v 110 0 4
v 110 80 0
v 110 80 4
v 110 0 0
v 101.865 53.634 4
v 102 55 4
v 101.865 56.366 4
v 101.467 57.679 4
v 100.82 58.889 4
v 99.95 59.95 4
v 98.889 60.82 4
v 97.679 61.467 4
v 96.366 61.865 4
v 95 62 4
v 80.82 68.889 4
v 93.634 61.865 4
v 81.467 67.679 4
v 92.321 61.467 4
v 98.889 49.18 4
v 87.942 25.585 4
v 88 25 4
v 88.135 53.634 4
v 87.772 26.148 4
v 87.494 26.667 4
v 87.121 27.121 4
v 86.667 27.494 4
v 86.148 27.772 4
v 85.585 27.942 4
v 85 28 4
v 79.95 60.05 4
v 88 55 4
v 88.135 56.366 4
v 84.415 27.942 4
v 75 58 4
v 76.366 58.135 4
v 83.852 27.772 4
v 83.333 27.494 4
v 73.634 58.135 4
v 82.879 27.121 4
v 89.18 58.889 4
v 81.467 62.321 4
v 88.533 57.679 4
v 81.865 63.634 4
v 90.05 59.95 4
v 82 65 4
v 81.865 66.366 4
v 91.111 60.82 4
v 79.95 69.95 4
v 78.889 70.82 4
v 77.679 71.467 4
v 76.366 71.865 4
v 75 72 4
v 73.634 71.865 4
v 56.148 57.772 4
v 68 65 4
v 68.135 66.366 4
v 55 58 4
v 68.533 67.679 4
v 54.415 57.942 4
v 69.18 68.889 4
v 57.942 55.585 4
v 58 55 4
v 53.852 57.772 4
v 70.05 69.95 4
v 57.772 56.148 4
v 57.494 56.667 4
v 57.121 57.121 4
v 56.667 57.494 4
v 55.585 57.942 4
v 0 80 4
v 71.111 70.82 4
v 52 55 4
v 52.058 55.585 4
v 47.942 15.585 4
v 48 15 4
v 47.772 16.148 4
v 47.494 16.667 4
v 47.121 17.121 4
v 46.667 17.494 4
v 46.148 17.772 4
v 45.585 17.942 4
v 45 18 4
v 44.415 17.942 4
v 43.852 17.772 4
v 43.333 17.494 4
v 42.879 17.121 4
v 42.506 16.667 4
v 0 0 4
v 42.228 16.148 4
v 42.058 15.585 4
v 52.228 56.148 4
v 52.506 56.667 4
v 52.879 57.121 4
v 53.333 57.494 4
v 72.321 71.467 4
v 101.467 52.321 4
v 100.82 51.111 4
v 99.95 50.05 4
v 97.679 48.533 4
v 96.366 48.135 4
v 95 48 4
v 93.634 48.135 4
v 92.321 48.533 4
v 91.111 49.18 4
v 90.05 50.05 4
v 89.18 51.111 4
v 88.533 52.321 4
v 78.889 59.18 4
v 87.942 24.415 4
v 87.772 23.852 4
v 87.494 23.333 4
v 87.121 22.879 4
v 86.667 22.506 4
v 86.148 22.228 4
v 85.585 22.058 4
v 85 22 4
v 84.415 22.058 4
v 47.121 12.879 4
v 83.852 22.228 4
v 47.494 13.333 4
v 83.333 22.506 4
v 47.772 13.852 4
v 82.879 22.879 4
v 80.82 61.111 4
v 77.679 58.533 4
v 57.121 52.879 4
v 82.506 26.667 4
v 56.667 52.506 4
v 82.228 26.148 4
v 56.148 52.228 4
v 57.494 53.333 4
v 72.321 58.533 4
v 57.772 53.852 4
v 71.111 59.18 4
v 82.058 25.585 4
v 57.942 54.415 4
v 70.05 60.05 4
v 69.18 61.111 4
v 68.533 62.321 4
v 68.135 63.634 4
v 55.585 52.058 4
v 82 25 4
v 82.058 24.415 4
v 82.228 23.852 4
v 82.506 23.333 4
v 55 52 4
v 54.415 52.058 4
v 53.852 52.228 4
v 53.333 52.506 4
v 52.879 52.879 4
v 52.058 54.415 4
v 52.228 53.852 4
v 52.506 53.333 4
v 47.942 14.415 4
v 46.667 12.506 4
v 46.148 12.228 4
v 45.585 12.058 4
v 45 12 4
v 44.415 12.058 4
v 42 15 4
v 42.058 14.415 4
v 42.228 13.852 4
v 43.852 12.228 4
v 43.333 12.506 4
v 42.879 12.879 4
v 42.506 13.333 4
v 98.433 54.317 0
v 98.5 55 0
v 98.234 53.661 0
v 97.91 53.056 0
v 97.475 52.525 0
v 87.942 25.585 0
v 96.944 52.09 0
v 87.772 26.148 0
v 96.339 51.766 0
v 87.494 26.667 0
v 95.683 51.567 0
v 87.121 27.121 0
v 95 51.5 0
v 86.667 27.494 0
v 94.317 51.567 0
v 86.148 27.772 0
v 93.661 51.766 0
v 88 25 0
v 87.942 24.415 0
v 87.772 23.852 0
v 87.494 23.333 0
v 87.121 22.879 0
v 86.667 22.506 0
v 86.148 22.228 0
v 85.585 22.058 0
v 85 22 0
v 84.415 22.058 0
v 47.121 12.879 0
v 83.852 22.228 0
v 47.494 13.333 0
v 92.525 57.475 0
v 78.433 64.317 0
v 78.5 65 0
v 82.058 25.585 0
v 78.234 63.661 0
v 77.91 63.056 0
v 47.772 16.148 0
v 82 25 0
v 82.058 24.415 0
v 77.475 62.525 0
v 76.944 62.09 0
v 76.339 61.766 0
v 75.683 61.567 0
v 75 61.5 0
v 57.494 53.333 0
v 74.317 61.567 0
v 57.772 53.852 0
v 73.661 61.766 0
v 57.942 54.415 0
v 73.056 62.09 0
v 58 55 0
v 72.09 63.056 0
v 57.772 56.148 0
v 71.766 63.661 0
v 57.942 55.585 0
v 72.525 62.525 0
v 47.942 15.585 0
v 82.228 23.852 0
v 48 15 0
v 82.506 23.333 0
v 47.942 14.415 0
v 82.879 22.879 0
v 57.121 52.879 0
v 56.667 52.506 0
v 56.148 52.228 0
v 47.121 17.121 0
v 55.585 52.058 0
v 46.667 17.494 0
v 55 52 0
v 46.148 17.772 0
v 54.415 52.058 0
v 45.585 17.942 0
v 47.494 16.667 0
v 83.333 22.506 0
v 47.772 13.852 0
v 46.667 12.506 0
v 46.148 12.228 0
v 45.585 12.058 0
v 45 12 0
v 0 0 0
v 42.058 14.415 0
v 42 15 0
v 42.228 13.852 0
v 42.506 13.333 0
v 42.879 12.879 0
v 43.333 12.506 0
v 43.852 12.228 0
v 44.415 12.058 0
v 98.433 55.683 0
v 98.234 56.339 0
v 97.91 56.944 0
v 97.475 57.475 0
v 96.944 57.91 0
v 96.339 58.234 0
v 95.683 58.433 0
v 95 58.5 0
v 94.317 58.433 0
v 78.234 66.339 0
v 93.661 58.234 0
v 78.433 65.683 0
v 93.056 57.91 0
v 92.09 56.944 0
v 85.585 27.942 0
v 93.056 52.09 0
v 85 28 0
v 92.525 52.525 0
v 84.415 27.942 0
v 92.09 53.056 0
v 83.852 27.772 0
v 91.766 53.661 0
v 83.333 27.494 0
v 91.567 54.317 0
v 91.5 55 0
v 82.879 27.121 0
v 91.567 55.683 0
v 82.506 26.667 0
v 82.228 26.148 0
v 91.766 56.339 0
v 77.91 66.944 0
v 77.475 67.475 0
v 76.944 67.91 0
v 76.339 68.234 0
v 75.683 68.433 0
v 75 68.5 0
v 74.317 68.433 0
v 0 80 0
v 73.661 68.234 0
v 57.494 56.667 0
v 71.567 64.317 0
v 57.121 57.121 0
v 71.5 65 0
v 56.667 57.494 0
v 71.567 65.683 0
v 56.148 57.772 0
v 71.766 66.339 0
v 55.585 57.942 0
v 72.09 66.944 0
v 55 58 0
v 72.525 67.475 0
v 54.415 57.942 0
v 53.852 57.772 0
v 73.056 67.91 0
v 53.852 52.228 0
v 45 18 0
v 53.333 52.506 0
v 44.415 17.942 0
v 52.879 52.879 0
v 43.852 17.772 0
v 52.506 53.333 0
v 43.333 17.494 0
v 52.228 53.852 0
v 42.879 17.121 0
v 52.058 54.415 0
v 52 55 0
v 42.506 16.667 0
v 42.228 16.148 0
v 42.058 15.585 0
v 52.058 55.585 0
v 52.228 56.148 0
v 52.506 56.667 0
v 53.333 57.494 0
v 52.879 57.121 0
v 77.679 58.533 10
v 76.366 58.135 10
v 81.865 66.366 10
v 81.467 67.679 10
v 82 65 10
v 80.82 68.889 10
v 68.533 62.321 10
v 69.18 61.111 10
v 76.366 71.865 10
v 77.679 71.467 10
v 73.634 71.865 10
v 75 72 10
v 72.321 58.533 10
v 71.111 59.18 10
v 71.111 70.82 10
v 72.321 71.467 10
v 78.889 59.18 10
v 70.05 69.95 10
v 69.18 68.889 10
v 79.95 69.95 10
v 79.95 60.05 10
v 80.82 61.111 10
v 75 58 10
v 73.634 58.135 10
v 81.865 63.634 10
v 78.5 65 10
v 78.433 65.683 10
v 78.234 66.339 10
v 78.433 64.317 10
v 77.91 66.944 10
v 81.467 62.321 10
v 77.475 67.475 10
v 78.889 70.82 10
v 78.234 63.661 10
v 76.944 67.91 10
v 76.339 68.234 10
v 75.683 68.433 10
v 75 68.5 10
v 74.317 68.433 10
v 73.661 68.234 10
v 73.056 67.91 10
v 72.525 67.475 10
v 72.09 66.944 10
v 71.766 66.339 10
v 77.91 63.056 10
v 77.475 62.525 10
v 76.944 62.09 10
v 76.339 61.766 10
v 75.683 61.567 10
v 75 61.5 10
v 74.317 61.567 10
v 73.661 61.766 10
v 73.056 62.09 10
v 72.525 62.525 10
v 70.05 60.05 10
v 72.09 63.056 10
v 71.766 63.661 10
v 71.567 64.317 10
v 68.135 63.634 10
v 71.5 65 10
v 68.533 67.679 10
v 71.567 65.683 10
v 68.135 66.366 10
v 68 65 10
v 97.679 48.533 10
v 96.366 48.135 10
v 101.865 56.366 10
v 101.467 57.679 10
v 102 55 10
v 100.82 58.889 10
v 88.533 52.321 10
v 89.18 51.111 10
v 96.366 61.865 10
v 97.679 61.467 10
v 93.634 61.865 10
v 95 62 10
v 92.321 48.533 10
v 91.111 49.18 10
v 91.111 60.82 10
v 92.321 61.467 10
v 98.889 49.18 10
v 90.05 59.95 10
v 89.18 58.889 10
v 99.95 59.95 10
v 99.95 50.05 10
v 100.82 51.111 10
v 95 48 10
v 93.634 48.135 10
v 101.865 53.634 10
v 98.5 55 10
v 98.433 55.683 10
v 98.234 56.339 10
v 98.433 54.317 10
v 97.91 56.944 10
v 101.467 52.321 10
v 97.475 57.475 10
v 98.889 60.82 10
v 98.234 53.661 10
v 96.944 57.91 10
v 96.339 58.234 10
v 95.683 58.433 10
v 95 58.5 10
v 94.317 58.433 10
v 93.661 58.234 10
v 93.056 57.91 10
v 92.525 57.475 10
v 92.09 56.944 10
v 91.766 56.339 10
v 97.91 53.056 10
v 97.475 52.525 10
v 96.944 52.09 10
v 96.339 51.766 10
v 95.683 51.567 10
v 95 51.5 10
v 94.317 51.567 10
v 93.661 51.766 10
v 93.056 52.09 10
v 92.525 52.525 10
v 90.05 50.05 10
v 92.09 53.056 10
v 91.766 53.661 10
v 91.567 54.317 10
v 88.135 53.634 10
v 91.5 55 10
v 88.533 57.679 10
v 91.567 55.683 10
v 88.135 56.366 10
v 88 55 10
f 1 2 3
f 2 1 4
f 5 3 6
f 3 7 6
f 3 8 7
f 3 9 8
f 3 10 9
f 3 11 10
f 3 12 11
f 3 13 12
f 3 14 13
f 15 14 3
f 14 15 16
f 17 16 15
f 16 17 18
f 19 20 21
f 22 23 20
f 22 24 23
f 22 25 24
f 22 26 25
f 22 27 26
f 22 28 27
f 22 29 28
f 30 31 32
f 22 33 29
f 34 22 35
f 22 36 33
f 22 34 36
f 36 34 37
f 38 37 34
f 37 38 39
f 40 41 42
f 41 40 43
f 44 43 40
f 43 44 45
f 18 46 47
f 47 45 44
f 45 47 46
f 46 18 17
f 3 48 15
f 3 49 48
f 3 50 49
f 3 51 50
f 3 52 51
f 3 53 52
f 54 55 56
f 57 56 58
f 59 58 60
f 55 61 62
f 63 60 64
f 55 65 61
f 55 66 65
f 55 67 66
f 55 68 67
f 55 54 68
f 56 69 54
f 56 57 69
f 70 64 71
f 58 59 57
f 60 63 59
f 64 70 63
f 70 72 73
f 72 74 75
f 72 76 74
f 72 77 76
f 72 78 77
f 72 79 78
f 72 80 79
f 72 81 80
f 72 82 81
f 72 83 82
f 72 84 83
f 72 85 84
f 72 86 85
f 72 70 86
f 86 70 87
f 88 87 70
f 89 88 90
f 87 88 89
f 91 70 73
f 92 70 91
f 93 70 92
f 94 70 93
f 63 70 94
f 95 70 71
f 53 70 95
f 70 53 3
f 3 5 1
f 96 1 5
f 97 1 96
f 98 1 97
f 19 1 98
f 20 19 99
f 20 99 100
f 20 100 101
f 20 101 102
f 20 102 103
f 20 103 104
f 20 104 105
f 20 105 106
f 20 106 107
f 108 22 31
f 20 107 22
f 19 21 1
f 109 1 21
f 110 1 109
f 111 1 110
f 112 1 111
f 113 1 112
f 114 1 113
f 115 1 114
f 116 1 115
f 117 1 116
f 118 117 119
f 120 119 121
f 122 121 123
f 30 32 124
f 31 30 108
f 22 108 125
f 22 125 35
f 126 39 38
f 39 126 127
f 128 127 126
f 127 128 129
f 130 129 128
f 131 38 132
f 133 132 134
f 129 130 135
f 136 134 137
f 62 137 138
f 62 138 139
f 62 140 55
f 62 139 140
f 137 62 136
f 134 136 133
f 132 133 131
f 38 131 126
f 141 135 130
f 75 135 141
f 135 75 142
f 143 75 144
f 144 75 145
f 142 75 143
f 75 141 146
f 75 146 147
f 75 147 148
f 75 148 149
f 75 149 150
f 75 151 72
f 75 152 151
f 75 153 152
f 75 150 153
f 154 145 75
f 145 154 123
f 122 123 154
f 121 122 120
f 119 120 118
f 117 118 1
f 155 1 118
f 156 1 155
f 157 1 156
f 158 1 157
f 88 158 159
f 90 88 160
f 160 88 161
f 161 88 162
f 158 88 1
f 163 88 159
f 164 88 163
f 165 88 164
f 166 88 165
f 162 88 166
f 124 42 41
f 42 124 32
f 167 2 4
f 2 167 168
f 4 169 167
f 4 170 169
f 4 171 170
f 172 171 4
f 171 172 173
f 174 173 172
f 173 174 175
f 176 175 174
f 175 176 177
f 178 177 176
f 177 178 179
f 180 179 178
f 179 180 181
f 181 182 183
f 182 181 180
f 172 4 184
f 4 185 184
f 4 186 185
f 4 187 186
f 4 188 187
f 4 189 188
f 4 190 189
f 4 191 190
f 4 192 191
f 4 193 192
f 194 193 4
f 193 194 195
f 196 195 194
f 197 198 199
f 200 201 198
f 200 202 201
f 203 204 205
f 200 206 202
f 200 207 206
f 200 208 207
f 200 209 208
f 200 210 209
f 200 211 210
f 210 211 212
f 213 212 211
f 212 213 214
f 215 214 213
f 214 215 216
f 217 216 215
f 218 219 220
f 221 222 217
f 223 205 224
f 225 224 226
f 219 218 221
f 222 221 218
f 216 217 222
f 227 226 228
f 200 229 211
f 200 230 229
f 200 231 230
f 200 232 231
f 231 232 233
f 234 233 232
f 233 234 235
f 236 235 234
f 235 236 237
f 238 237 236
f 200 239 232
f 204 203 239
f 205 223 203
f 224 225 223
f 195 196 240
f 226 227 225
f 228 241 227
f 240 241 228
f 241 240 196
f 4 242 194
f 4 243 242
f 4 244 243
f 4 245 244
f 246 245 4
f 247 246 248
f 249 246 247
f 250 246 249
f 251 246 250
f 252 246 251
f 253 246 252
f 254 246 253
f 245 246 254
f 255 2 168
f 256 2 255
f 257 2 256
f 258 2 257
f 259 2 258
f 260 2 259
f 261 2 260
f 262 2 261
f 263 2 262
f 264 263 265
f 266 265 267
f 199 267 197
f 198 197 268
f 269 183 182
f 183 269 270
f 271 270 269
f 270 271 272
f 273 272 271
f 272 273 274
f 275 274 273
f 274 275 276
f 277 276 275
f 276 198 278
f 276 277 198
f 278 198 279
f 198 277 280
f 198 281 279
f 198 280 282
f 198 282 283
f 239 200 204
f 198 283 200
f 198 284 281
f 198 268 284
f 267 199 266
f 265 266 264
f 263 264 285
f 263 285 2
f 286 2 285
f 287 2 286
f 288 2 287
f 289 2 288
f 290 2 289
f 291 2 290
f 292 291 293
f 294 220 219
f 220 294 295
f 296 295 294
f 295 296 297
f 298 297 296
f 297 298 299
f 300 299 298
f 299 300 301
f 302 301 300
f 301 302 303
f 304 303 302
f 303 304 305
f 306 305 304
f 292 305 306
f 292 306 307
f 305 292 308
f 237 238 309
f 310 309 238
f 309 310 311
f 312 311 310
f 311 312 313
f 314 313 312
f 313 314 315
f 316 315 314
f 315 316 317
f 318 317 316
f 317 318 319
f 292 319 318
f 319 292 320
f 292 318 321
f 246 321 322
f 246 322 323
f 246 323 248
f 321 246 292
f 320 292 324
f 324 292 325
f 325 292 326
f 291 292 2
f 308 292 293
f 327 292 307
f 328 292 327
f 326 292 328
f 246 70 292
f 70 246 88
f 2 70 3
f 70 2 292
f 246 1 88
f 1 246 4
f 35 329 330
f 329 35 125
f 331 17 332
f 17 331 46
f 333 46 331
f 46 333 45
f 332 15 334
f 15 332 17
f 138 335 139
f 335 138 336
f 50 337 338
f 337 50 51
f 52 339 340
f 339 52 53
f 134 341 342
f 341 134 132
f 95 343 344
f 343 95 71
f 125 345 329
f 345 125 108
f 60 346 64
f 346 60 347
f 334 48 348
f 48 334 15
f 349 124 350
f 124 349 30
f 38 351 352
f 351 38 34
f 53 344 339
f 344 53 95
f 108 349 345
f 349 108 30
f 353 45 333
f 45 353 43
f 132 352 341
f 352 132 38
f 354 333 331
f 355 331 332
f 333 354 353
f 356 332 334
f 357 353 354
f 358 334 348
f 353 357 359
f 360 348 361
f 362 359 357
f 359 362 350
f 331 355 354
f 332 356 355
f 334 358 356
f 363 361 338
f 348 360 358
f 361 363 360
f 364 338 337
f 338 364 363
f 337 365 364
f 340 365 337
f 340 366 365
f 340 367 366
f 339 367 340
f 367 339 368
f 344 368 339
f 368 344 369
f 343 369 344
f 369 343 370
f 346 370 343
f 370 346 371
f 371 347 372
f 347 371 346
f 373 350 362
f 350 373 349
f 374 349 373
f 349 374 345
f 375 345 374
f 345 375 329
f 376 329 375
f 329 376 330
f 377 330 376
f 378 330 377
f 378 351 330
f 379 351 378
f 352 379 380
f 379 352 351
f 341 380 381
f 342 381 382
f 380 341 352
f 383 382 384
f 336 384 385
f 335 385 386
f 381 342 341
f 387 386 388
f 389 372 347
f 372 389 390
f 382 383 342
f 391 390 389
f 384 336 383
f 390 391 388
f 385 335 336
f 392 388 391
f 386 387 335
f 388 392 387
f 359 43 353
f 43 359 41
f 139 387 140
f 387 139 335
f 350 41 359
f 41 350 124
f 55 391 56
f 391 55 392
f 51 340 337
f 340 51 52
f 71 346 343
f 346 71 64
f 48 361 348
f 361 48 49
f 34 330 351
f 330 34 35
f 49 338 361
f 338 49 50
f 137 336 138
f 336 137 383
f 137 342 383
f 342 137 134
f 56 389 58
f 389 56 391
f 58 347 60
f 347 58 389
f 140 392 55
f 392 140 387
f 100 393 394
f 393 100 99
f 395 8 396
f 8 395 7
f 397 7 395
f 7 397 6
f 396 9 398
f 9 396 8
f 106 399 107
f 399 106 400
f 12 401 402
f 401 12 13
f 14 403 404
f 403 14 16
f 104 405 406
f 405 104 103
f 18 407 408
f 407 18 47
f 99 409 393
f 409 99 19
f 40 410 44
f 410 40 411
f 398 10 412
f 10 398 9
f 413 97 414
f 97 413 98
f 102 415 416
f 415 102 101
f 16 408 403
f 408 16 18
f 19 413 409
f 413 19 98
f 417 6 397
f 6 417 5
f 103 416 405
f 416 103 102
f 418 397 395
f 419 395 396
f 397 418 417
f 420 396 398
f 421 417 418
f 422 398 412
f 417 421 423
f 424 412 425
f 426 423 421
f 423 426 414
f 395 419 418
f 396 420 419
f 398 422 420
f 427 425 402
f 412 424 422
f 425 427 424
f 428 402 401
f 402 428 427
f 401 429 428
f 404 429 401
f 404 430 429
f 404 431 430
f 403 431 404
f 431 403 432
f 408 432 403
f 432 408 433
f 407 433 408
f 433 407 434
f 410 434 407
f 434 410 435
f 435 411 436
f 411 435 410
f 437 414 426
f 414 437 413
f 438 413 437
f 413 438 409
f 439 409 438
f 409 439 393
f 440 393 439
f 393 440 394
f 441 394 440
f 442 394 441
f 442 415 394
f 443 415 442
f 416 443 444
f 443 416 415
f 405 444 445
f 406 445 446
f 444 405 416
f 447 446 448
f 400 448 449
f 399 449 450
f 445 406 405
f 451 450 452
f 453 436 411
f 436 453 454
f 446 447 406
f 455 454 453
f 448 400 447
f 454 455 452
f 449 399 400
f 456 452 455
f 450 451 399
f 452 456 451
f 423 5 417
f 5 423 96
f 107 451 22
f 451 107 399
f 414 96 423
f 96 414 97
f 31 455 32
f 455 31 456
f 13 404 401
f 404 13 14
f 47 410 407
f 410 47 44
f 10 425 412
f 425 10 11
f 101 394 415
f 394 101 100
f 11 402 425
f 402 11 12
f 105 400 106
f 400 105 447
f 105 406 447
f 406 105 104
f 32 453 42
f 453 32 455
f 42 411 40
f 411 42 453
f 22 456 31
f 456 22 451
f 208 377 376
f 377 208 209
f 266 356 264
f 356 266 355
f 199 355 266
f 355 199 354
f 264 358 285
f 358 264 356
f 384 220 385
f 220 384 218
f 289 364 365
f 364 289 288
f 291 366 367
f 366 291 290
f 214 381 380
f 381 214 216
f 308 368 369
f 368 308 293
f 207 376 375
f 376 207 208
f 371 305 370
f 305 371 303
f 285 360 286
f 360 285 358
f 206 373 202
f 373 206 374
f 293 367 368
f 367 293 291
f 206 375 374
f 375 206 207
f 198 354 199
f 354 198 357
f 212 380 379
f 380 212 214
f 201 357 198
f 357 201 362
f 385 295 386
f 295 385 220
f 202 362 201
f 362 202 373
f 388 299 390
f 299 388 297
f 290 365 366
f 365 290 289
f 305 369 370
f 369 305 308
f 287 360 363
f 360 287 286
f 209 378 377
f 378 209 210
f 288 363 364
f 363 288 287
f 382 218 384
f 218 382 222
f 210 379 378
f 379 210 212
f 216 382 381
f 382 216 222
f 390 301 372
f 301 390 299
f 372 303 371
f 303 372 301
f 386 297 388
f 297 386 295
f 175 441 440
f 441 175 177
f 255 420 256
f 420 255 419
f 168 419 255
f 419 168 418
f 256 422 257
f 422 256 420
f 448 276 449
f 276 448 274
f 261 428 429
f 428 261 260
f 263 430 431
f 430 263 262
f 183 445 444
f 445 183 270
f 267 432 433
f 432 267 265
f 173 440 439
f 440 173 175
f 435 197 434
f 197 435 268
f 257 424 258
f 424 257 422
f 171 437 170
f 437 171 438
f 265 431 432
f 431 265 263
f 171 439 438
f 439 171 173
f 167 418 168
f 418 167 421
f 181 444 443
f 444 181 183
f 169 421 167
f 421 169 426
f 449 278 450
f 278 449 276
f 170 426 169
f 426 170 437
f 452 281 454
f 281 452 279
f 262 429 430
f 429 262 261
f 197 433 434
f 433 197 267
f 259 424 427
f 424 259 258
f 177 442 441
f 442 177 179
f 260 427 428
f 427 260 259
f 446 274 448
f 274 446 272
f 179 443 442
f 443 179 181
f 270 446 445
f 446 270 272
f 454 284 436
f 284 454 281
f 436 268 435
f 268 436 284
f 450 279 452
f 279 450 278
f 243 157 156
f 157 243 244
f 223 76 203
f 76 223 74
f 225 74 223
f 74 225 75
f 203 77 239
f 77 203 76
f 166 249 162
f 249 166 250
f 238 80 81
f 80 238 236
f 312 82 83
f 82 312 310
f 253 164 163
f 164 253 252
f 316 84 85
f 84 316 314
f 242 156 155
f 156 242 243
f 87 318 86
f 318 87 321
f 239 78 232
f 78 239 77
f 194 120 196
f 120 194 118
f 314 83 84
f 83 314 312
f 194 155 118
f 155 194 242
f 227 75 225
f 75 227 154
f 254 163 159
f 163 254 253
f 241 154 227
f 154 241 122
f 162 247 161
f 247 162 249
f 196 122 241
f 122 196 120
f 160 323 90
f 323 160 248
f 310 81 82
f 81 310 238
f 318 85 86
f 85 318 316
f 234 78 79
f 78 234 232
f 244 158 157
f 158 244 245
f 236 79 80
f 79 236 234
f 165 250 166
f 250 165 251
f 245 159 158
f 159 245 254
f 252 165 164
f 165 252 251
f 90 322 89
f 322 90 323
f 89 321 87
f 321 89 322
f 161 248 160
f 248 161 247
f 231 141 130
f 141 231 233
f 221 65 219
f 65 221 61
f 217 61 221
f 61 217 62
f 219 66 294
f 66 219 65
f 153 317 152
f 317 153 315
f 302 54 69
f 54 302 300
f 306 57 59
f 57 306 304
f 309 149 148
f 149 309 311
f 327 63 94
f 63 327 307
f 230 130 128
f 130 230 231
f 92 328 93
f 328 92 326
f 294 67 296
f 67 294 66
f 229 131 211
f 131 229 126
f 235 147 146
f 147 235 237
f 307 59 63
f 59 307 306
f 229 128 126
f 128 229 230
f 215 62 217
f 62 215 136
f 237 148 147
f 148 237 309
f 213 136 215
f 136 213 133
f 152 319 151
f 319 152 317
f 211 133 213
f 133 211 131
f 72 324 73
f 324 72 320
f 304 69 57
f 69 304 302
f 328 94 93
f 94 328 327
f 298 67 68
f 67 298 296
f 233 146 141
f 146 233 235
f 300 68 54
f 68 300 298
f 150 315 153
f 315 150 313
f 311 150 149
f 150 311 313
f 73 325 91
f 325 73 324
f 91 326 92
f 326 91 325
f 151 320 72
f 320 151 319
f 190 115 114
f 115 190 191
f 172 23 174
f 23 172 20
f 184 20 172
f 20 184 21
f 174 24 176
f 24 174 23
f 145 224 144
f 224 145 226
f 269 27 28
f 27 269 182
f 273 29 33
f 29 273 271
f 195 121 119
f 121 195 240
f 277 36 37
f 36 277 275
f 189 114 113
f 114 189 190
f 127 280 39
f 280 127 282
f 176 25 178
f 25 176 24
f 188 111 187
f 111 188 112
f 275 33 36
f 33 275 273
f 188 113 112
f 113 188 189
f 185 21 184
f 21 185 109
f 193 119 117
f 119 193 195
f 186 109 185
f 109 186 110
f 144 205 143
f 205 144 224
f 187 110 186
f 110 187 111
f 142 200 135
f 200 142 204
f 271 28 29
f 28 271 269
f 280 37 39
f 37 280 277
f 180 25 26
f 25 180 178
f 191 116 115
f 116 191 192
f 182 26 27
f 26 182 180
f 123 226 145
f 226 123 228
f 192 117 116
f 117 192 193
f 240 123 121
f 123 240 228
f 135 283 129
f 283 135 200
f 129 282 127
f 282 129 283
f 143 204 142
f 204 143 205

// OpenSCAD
$fn = 32;

// ----------------------------------------------------------------------
// Mixed field: bosses and holes at given coordinates
// ----------------------------------------------------------------------

// --- parameters (mm) ---
plate_l = 110;            // plate length, X
plate_w = 80;             // plate width, Y
plate_t = 4;              // plate thickness, Z
boss_d = 14;              // boss diameter
boss_h = 6;               // boss height above the plate
hole_d = 6;               // through hole diameter

total_h = plate_t + boss_h;  // overall height

difference() {
  union() {
    cube([plate_l, plate_w, plate_t]);
    translate([75, 65, plate_t]) cylinder(h = boss_h, d = boss_d);
    translate([95, 55, plate_t]) cylinder(h = boss_h, d = boss_d);
  }
  translate([75, 65, -1]) cylinder(h = total_h + 2, d = boss_d / 2);
  translate([95, 55, -1]) cylinder(h = total_h + 2, d = boss_d / 2);
  translate([45, 15, -1]) cylinder(h = plate_t + 2, d = hole_d);
  translate([55, 55, -1]) cylinder(h = plate_t + 2, d = hole_d);
  translate([85, 25, -1]) cylinder(h = plate_t + 2, d = hole_d);
}
